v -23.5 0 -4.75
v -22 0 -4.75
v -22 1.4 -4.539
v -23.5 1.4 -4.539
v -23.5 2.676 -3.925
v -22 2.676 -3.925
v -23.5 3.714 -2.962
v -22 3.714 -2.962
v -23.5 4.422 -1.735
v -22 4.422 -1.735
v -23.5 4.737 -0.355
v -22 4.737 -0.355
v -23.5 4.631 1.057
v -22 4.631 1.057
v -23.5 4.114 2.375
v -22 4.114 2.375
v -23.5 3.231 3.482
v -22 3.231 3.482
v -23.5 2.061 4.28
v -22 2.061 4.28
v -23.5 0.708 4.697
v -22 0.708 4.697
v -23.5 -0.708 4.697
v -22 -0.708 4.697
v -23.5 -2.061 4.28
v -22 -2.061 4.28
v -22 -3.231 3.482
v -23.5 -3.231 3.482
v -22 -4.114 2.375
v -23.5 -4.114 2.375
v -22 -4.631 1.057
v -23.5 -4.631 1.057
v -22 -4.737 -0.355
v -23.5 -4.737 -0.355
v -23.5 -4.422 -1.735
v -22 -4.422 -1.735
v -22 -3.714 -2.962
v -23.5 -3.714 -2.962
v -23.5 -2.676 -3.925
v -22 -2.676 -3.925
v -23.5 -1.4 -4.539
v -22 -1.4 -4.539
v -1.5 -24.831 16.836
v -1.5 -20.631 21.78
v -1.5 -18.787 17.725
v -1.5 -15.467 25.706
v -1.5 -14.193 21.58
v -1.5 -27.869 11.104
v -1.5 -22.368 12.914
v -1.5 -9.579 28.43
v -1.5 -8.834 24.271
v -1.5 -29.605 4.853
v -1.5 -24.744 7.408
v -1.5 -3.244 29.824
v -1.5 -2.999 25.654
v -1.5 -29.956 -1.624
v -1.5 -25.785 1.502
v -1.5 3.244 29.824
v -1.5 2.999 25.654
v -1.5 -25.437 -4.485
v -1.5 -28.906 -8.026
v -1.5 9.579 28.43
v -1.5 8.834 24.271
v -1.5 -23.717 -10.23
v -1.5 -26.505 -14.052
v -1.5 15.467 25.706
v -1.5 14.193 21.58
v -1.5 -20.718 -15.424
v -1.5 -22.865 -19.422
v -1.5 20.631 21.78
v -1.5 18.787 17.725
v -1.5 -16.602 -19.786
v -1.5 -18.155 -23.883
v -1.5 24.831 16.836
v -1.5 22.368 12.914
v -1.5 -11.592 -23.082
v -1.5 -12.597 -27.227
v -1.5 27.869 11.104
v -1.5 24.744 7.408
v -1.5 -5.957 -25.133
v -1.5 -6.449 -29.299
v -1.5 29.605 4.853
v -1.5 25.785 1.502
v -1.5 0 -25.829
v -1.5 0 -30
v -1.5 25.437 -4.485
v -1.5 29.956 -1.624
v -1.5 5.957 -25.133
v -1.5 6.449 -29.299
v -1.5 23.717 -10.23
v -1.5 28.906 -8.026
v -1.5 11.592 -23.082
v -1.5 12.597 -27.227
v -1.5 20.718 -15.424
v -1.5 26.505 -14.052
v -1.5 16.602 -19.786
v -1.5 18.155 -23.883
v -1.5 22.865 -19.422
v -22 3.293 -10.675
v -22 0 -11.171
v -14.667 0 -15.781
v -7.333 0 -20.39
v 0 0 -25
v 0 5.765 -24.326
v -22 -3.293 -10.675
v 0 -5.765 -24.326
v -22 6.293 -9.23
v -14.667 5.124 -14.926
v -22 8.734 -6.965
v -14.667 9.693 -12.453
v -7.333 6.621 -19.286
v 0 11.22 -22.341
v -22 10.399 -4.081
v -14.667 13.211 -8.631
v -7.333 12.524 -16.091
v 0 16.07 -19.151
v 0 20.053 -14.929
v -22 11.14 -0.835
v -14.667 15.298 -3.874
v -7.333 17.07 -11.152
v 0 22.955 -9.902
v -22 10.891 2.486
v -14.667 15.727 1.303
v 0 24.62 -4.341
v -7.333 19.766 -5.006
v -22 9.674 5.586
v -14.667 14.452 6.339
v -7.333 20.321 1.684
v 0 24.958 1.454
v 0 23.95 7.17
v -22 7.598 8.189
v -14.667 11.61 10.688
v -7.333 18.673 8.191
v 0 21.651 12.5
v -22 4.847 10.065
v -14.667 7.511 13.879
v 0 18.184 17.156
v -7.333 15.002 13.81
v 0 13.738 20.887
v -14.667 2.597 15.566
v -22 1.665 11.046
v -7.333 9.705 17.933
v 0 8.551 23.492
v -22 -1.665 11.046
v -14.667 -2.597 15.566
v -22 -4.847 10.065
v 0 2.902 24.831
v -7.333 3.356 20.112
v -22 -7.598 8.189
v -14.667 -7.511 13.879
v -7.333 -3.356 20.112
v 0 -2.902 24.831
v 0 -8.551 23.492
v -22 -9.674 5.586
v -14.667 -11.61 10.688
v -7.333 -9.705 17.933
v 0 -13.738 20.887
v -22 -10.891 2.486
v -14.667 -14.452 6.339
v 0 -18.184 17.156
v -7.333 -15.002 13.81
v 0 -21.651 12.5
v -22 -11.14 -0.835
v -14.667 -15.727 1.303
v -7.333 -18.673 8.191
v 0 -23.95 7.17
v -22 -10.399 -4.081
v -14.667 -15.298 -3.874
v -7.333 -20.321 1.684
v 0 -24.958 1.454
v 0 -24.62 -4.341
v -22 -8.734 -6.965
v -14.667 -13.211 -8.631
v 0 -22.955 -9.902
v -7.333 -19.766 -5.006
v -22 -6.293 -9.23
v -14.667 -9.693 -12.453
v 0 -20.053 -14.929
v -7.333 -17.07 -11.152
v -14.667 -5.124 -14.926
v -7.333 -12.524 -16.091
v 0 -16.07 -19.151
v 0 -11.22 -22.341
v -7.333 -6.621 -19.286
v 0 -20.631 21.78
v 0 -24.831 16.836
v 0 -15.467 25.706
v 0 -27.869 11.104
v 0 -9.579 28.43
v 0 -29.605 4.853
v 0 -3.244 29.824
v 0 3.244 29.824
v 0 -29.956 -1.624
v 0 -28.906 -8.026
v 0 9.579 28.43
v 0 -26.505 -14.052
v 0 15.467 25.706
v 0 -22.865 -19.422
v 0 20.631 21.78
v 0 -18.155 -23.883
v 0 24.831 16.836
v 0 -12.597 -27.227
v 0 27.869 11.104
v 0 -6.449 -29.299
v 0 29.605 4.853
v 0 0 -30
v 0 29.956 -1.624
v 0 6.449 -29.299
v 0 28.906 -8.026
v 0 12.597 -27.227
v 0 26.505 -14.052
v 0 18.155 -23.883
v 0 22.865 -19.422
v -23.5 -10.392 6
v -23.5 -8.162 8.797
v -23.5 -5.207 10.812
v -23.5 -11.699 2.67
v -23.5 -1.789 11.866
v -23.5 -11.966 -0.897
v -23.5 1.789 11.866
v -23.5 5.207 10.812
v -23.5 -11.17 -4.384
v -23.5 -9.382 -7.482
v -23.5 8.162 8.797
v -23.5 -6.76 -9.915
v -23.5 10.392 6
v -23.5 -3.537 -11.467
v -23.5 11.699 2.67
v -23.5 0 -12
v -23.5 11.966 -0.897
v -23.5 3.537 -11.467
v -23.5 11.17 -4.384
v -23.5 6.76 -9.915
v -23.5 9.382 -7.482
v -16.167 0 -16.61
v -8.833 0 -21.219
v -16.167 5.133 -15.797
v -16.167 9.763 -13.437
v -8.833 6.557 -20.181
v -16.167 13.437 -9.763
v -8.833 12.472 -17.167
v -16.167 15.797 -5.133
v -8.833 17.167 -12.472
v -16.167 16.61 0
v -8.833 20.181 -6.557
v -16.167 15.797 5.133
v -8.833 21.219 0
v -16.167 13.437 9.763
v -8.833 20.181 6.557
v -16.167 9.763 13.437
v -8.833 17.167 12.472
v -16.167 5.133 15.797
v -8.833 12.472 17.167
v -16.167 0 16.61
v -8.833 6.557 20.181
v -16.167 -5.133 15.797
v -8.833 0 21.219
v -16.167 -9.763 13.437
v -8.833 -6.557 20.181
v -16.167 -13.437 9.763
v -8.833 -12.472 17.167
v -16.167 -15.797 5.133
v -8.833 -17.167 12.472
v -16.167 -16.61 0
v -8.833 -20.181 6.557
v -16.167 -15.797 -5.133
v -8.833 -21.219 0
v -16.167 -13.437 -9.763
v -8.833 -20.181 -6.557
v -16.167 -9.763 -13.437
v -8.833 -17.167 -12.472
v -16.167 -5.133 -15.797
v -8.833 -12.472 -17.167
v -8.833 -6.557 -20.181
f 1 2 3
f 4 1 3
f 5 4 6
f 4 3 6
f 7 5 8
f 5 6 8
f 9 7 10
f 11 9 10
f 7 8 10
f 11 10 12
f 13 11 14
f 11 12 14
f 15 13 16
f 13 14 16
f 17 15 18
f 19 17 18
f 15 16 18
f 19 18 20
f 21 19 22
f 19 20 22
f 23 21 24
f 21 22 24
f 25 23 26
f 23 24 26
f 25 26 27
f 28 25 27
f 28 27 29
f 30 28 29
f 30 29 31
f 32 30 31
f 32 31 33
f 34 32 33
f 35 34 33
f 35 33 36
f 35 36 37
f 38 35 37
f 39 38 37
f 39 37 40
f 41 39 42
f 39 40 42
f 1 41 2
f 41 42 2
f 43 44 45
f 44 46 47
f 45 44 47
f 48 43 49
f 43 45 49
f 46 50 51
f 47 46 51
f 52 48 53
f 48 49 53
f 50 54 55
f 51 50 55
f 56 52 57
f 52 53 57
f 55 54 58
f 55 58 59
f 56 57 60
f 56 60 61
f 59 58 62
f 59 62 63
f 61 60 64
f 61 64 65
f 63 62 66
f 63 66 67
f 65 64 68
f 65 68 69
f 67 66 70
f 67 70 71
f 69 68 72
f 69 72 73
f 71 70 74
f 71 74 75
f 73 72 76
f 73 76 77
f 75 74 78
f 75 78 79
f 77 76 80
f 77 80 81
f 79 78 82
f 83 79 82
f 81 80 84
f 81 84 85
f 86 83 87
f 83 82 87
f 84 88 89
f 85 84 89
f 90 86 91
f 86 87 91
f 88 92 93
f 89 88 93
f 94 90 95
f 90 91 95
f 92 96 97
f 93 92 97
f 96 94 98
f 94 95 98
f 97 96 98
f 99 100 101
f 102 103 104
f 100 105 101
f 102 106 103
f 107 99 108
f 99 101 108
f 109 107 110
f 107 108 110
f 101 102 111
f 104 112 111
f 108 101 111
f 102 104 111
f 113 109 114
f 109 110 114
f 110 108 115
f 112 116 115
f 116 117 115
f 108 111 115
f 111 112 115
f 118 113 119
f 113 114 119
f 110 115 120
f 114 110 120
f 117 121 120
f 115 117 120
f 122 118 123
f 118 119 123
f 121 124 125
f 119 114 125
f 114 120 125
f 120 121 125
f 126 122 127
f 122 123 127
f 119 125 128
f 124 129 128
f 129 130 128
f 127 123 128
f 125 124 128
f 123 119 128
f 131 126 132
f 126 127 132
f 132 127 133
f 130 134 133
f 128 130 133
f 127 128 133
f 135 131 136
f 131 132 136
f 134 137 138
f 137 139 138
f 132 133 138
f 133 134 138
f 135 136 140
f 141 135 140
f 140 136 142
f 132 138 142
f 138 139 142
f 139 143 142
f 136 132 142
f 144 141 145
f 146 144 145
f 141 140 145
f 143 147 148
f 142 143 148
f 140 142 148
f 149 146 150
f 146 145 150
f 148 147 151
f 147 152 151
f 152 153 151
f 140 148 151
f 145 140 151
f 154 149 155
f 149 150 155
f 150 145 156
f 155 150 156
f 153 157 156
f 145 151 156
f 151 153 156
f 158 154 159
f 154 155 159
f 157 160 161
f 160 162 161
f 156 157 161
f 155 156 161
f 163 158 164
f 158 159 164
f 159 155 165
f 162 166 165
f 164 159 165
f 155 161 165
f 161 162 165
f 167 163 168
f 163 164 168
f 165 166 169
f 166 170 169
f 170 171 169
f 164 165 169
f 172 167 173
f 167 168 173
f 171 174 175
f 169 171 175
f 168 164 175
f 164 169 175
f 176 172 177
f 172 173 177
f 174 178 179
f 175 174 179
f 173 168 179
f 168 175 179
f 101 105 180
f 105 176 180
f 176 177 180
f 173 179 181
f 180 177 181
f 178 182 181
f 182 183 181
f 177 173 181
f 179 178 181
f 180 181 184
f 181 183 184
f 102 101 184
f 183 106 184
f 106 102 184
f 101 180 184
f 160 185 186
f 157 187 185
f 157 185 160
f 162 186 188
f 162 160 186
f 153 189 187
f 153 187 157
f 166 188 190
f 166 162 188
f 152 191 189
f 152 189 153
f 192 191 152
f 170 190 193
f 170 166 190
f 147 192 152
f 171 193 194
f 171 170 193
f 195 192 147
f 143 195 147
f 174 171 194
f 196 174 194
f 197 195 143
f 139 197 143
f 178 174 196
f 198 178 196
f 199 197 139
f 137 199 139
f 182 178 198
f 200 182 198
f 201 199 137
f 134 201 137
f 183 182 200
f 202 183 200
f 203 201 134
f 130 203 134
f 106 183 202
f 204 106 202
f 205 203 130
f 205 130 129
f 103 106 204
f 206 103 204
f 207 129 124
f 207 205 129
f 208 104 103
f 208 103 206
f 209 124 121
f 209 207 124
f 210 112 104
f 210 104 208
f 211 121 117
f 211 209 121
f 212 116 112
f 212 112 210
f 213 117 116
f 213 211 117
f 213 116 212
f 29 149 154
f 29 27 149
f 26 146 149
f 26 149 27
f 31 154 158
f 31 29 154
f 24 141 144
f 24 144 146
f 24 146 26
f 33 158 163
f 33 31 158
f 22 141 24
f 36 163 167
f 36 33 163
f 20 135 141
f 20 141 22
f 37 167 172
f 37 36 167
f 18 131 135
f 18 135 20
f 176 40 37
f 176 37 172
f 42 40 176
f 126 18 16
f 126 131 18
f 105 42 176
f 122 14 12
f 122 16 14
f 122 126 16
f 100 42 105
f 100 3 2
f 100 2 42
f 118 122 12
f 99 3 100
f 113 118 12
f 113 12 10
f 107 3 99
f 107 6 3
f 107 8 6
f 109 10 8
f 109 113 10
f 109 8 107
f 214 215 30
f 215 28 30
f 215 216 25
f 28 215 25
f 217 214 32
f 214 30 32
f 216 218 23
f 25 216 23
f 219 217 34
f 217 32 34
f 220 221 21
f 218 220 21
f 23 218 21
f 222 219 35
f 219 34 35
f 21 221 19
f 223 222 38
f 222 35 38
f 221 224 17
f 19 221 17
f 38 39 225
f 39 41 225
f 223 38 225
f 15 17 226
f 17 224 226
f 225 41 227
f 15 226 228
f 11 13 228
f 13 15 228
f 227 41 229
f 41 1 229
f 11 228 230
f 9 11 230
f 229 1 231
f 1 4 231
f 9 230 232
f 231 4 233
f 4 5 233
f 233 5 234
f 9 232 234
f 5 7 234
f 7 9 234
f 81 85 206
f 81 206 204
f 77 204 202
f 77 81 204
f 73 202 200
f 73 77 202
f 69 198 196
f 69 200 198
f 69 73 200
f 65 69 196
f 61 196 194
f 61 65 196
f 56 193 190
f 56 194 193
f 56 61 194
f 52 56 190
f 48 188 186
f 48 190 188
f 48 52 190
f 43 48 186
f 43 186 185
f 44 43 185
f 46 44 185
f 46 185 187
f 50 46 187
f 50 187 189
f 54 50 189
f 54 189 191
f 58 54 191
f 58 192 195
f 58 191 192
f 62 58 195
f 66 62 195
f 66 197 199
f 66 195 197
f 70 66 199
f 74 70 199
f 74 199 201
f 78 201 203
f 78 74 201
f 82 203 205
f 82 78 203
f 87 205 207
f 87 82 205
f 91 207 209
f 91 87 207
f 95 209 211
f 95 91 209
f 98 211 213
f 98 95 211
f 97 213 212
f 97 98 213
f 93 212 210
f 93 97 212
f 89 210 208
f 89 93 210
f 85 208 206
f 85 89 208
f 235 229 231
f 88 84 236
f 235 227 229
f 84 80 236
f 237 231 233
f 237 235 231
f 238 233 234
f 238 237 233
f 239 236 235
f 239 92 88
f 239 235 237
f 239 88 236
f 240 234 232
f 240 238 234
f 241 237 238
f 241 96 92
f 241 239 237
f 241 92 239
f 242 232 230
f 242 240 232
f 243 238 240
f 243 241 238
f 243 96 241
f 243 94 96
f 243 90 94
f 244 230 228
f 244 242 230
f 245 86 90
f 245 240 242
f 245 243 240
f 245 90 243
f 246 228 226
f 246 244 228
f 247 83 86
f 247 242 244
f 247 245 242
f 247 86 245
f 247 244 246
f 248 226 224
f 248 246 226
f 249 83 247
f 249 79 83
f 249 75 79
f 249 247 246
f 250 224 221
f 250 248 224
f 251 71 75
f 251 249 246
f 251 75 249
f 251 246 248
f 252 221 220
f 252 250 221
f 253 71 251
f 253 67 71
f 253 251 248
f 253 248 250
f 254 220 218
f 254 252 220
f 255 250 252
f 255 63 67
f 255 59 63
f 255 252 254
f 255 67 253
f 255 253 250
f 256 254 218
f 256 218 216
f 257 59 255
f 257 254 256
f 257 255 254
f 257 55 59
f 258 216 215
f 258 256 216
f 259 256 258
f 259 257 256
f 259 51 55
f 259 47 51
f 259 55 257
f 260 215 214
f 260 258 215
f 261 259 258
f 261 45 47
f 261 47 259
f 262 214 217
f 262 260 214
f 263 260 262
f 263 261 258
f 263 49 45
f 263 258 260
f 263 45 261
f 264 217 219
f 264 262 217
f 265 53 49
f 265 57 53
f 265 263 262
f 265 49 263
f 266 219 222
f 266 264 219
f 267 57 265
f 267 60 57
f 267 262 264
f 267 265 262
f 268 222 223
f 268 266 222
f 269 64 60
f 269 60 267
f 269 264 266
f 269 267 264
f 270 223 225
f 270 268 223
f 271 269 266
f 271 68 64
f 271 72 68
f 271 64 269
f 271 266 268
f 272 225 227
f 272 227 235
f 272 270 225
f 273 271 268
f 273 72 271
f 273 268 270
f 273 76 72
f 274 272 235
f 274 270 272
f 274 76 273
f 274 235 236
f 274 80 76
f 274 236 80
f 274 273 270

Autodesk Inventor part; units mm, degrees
ref_plane "YZ Plane" through (0, 0, 0) normal (1, 0, 0) x (0, 1, 0)
ref_plane "XZ Plane" through (0, 0, 0) normal (0, 1, 0) x (-1, 0, 0)
ref_plane "XY Plane" through (0, 0, 0) normal (0, 0, 1) x (1, 0, 0)
sketch "Sketch1" plane through (0, 0, 0) normal (0, 1, 0) x (-1, 0, 0)
  point P0 (0, 0)
sketch "Sketch2" plane through (0, 0, 0) normal (0, 1, 0) x (-1, 0, 0)
  line L0 (0, -25) -> (0, -30)
  line L1 (0, -30) -> (1.5, -30)
  line L2 (1.5, -30) -> (1.5, -25.8289)
  line L3 (1.5, -25.8289) -> (23.5, -12)
  line L4 (23.5, -12) -> (23.5, -4.75)
  line L5 (23.5, -4.75) -> (22, -4.75)
  line L6 (22, -4.75) -> (22, -11.1711)
  line L7 (22, -11.1711) -> (0, -25)
  line L8 (28.2, 0) -> (-4.7, 0) projected
  line L9 (0, -36) -> (0, 6) projected
  dimension "d6" = 1.5
  dimension "d7" = 1.5
  dimension "d8" = 4.75
  dimension "d9" = 7.25
  dimension "d10" = 5
  dimension "d11" = 30
  dimension "d12" = 23.5
  dimension "d13" = 1.5
revolve "Revolution1" add sketch "Sketch2" angle 360 about axis through (-10, 0, 0) along (1, 0, 0)
properties part number "base-biotrap"
